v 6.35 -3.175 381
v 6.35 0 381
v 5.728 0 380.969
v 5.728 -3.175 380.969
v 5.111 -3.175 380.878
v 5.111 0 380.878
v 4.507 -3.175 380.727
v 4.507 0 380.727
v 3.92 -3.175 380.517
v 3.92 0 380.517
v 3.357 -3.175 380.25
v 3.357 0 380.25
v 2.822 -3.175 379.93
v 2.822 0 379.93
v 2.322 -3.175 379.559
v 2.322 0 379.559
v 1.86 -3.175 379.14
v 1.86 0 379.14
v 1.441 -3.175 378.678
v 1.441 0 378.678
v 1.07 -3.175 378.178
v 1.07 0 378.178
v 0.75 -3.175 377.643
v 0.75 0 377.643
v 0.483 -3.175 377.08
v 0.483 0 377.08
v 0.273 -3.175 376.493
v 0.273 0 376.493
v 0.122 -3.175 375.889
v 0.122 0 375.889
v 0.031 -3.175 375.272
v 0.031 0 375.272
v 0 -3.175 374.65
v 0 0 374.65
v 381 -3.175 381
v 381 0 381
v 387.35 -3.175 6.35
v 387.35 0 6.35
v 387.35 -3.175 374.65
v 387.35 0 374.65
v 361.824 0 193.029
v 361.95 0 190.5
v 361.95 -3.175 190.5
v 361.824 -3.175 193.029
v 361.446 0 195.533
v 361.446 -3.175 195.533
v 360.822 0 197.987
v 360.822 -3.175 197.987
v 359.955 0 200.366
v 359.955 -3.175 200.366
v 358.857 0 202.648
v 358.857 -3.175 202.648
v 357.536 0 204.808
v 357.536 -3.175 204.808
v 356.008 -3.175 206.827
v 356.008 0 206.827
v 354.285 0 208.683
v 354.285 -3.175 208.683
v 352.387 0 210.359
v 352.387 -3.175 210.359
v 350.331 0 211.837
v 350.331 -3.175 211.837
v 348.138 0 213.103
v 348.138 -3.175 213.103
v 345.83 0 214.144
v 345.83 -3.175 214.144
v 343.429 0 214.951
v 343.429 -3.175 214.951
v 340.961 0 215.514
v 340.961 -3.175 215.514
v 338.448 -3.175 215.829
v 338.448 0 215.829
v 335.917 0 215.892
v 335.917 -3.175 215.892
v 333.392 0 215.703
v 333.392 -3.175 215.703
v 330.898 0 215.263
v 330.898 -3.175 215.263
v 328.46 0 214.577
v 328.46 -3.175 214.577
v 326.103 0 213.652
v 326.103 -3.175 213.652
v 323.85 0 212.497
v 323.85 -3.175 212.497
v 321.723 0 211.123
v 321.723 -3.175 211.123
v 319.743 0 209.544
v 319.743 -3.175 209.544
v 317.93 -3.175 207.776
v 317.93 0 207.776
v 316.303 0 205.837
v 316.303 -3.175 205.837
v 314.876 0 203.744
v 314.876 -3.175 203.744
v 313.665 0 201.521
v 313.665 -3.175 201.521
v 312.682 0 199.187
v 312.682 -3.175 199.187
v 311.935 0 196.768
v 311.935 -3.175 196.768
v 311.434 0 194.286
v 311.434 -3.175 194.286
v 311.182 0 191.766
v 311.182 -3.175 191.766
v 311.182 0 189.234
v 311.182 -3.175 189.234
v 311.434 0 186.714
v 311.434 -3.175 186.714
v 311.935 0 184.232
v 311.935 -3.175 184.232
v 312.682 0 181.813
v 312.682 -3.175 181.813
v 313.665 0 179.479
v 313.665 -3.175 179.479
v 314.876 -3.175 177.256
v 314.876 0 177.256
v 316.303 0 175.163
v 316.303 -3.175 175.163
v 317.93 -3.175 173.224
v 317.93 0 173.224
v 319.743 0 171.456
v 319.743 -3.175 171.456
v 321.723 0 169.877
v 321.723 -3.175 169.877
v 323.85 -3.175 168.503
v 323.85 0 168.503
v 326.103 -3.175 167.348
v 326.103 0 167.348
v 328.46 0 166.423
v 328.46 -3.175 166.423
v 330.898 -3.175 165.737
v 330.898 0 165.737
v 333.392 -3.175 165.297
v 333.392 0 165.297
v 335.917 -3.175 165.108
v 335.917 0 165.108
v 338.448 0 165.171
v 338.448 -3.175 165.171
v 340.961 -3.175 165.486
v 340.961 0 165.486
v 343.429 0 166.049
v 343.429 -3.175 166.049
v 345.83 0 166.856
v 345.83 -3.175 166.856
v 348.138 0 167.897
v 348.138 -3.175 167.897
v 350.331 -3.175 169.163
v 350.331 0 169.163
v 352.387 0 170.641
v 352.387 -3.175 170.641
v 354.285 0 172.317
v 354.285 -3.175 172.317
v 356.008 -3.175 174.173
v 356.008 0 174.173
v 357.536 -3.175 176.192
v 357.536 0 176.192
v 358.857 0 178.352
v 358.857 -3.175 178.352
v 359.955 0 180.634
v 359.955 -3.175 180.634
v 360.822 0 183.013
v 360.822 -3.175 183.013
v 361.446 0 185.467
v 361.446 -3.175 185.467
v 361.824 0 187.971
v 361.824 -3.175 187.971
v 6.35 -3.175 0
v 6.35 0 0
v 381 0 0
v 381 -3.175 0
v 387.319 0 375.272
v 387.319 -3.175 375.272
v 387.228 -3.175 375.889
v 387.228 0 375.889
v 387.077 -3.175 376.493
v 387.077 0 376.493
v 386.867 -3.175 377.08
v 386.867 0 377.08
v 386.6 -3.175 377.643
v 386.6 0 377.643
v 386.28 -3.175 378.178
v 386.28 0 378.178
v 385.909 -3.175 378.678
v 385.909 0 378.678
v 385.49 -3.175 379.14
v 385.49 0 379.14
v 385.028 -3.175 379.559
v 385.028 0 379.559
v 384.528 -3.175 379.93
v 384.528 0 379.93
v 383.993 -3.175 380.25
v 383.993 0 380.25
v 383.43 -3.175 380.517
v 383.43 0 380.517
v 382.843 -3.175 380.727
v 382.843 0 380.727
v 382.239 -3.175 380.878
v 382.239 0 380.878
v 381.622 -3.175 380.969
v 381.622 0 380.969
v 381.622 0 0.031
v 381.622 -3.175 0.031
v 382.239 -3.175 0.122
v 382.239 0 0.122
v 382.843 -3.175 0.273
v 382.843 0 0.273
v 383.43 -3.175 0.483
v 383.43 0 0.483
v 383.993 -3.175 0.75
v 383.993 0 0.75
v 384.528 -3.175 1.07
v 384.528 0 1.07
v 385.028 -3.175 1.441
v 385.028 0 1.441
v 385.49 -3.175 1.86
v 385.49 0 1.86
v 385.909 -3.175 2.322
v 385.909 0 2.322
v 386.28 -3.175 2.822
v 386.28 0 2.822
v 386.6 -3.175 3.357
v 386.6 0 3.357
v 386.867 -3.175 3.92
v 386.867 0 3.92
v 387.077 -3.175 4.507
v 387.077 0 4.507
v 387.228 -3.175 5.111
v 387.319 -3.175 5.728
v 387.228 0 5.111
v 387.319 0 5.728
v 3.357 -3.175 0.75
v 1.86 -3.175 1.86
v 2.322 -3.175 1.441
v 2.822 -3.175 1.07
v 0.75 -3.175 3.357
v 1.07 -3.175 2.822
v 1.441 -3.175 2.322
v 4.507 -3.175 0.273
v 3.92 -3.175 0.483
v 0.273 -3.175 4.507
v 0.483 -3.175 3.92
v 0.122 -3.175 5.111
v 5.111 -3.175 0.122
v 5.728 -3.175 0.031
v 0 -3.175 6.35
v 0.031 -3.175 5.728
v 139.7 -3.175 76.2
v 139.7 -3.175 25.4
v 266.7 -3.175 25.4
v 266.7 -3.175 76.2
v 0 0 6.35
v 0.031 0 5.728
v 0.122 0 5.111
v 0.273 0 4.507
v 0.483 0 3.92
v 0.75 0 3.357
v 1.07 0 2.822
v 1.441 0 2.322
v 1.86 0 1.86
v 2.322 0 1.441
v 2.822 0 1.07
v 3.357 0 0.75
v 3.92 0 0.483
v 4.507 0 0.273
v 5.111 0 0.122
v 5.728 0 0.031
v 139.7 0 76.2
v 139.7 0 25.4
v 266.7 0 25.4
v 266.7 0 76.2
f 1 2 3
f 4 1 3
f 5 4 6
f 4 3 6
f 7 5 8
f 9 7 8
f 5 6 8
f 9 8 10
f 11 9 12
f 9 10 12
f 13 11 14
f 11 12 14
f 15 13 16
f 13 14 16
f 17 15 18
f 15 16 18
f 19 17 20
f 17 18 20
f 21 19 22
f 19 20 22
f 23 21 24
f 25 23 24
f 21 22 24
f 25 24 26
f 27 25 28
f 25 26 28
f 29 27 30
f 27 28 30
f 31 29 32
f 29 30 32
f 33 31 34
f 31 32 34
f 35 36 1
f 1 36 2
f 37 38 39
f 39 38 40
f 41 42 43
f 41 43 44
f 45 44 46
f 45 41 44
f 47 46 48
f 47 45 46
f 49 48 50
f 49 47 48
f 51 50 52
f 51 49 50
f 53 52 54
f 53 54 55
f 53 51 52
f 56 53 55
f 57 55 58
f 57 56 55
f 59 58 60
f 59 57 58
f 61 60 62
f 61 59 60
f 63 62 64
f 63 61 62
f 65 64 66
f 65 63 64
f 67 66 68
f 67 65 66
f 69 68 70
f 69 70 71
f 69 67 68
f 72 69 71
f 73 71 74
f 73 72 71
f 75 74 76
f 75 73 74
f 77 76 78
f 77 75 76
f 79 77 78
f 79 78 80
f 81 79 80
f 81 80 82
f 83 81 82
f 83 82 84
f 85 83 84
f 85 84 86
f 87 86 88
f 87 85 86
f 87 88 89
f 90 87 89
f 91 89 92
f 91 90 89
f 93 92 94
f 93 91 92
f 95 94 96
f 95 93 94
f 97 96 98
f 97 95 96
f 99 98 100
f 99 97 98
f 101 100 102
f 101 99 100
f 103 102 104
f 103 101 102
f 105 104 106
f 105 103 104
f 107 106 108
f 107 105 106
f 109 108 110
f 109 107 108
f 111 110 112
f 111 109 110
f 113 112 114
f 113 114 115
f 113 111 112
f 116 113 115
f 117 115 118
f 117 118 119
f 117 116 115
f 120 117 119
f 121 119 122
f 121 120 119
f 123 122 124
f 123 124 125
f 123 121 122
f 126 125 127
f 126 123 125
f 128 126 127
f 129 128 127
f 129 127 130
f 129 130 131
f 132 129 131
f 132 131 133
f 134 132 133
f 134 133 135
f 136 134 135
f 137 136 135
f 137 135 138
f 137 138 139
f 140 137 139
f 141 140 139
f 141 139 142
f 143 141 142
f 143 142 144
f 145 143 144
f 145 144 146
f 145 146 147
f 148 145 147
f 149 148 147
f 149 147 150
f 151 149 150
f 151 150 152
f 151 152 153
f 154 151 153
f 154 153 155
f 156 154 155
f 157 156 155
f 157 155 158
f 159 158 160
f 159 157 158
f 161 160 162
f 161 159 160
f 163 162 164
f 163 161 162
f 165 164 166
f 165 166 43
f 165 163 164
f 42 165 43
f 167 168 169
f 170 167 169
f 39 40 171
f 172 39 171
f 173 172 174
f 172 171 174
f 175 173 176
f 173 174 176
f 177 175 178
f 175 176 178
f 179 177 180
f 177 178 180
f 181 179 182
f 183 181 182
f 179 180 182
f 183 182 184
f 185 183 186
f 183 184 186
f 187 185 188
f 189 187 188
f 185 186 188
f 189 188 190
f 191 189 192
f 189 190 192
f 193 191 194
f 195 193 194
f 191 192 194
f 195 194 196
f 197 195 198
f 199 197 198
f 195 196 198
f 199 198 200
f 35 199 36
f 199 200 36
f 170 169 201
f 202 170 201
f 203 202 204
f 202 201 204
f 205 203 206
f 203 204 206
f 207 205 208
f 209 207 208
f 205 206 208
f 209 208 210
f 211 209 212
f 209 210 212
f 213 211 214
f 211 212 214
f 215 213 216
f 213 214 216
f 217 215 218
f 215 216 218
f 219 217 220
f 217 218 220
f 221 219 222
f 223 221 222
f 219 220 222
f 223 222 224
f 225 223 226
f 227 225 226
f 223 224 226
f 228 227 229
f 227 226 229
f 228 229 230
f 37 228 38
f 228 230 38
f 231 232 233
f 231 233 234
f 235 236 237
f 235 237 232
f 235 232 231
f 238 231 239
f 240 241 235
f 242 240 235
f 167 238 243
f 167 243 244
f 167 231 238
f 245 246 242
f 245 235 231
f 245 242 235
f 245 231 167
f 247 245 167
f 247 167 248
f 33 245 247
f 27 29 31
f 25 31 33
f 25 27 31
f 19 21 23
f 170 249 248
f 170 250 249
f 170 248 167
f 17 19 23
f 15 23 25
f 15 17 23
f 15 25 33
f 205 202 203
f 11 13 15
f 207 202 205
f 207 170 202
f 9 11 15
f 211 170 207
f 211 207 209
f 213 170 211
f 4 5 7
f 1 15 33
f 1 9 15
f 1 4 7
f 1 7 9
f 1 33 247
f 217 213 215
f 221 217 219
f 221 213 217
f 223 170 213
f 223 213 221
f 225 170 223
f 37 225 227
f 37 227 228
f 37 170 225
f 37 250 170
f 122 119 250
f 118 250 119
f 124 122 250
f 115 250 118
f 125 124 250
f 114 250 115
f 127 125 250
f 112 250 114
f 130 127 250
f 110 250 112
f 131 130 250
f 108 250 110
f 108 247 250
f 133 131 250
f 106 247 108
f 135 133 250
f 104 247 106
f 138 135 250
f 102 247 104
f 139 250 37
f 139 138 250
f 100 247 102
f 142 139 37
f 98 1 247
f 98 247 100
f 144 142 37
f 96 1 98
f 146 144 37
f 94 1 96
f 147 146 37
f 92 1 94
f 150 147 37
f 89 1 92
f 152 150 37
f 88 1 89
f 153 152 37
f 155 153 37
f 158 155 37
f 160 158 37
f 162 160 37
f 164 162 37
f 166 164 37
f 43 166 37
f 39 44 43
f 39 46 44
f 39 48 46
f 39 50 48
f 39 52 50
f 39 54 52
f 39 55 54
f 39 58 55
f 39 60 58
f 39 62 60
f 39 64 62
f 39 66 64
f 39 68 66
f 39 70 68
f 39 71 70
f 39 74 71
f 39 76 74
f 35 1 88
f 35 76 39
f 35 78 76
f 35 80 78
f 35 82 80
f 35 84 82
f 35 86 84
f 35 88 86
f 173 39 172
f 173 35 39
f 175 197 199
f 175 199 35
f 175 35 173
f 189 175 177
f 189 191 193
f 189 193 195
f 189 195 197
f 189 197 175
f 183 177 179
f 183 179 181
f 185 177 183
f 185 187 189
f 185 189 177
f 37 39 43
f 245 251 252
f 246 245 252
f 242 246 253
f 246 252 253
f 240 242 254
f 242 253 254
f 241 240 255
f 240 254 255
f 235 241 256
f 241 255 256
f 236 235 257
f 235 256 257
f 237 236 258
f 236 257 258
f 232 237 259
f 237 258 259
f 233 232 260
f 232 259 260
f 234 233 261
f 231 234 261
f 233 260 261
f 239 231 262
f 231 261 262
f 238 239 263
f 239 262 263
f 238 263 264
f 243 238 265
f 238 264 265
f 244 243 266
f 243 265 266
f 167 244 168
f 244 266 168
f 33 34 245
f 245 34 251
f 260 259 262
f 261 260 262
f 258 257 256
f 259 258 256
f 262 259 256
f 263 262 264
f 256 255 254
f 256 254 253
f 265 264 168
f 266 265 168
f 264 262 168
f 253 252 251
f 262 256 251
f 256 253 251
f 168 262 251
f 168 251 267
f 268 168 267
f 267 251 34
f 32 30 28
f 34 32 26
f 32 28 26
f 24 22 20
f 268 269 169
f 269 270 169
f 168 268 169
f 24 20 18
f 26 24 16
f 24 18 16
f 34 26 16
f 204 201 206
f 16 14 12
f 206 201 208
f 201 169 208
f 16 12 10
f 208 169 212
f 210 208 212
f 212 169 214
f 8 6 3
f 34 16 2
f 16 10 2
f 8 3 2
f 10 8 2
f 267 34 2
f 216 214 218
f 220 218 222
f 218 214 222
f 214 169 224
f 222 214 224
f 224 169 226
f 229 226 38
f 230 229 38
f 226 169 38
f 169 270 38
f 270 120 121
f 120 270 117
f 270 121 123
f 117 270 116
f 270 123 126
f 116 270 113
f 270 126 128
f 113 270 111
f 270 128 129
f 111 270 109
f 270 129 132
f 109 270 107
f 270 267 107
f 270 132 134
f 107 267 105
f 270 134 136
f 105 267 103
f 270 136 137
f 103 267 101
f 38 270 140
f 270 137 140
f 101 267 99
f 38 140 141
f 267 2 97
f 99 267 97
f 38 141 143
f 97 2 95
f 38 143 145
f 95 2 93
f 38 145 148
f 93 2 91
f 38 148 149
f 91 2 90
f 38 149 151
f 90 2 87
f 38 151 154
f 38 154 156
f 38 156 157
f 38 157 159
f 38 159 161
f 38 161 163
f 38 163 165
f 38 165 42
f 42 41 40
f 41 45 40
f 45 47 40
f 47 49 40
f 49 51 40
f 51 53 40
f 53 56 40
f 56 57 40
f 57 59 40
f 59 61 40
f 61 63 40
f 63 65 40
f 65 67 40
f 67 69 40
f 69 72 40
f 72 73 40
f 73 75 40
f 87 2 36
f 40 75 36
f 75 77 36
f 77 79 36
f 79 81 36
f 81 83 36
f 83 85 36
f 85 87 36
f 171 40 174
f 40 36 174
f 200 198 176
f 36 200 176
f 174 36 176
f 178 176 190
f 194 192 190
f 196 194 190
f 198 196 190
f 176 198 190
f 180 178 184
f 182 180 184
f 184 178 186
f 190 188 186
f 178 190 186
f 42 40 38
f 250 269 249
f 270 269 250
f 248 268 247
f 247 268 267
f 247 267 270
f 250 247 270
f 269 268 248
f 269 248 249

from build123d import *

# Parameters (mm, degrees)
F0_W     = 127
F0_H     = 50.8
F0_R     = 25.4
F1_DEPTH = 3.175


with BuildPart() as f1:
    # F0 (on Front) → F1 (new body)
    with BuildSketch(Plane.XZ):
        with BuildLine():
            ThreePointArc((0, 6.35), (1.859872, 1.859872), (6.35, 0))
            Line((6.35, 0), (381, 0))
            ThreePointArc((381, 0), (385.490128, 1.859872), (387.35, 6.35))
            Line((387.35, 6.35), (387.35, 374.65))
            ThreePointArc((387.35, 374.65), (385.490128, 379.140128), (381, 381))
            Line((381, 381), (6.35, 381))
            ThreePointArc((6.35, 381), (1.859872, 379.140128), (0, 374.65))
            Line((0, 374.65), (0, 6.35))
        make_face()
        with Locations((203.2, 50.8)):
            Rectangle(F0_W, F0_H, mode=Mode.SUBTRACT)
        with Locations((336.55, 190.5)):
            Circle(F0_R, mode=Mode.SUBTRACT)
    extrude(amount=F1_DEPTH)


solid = f1.part
